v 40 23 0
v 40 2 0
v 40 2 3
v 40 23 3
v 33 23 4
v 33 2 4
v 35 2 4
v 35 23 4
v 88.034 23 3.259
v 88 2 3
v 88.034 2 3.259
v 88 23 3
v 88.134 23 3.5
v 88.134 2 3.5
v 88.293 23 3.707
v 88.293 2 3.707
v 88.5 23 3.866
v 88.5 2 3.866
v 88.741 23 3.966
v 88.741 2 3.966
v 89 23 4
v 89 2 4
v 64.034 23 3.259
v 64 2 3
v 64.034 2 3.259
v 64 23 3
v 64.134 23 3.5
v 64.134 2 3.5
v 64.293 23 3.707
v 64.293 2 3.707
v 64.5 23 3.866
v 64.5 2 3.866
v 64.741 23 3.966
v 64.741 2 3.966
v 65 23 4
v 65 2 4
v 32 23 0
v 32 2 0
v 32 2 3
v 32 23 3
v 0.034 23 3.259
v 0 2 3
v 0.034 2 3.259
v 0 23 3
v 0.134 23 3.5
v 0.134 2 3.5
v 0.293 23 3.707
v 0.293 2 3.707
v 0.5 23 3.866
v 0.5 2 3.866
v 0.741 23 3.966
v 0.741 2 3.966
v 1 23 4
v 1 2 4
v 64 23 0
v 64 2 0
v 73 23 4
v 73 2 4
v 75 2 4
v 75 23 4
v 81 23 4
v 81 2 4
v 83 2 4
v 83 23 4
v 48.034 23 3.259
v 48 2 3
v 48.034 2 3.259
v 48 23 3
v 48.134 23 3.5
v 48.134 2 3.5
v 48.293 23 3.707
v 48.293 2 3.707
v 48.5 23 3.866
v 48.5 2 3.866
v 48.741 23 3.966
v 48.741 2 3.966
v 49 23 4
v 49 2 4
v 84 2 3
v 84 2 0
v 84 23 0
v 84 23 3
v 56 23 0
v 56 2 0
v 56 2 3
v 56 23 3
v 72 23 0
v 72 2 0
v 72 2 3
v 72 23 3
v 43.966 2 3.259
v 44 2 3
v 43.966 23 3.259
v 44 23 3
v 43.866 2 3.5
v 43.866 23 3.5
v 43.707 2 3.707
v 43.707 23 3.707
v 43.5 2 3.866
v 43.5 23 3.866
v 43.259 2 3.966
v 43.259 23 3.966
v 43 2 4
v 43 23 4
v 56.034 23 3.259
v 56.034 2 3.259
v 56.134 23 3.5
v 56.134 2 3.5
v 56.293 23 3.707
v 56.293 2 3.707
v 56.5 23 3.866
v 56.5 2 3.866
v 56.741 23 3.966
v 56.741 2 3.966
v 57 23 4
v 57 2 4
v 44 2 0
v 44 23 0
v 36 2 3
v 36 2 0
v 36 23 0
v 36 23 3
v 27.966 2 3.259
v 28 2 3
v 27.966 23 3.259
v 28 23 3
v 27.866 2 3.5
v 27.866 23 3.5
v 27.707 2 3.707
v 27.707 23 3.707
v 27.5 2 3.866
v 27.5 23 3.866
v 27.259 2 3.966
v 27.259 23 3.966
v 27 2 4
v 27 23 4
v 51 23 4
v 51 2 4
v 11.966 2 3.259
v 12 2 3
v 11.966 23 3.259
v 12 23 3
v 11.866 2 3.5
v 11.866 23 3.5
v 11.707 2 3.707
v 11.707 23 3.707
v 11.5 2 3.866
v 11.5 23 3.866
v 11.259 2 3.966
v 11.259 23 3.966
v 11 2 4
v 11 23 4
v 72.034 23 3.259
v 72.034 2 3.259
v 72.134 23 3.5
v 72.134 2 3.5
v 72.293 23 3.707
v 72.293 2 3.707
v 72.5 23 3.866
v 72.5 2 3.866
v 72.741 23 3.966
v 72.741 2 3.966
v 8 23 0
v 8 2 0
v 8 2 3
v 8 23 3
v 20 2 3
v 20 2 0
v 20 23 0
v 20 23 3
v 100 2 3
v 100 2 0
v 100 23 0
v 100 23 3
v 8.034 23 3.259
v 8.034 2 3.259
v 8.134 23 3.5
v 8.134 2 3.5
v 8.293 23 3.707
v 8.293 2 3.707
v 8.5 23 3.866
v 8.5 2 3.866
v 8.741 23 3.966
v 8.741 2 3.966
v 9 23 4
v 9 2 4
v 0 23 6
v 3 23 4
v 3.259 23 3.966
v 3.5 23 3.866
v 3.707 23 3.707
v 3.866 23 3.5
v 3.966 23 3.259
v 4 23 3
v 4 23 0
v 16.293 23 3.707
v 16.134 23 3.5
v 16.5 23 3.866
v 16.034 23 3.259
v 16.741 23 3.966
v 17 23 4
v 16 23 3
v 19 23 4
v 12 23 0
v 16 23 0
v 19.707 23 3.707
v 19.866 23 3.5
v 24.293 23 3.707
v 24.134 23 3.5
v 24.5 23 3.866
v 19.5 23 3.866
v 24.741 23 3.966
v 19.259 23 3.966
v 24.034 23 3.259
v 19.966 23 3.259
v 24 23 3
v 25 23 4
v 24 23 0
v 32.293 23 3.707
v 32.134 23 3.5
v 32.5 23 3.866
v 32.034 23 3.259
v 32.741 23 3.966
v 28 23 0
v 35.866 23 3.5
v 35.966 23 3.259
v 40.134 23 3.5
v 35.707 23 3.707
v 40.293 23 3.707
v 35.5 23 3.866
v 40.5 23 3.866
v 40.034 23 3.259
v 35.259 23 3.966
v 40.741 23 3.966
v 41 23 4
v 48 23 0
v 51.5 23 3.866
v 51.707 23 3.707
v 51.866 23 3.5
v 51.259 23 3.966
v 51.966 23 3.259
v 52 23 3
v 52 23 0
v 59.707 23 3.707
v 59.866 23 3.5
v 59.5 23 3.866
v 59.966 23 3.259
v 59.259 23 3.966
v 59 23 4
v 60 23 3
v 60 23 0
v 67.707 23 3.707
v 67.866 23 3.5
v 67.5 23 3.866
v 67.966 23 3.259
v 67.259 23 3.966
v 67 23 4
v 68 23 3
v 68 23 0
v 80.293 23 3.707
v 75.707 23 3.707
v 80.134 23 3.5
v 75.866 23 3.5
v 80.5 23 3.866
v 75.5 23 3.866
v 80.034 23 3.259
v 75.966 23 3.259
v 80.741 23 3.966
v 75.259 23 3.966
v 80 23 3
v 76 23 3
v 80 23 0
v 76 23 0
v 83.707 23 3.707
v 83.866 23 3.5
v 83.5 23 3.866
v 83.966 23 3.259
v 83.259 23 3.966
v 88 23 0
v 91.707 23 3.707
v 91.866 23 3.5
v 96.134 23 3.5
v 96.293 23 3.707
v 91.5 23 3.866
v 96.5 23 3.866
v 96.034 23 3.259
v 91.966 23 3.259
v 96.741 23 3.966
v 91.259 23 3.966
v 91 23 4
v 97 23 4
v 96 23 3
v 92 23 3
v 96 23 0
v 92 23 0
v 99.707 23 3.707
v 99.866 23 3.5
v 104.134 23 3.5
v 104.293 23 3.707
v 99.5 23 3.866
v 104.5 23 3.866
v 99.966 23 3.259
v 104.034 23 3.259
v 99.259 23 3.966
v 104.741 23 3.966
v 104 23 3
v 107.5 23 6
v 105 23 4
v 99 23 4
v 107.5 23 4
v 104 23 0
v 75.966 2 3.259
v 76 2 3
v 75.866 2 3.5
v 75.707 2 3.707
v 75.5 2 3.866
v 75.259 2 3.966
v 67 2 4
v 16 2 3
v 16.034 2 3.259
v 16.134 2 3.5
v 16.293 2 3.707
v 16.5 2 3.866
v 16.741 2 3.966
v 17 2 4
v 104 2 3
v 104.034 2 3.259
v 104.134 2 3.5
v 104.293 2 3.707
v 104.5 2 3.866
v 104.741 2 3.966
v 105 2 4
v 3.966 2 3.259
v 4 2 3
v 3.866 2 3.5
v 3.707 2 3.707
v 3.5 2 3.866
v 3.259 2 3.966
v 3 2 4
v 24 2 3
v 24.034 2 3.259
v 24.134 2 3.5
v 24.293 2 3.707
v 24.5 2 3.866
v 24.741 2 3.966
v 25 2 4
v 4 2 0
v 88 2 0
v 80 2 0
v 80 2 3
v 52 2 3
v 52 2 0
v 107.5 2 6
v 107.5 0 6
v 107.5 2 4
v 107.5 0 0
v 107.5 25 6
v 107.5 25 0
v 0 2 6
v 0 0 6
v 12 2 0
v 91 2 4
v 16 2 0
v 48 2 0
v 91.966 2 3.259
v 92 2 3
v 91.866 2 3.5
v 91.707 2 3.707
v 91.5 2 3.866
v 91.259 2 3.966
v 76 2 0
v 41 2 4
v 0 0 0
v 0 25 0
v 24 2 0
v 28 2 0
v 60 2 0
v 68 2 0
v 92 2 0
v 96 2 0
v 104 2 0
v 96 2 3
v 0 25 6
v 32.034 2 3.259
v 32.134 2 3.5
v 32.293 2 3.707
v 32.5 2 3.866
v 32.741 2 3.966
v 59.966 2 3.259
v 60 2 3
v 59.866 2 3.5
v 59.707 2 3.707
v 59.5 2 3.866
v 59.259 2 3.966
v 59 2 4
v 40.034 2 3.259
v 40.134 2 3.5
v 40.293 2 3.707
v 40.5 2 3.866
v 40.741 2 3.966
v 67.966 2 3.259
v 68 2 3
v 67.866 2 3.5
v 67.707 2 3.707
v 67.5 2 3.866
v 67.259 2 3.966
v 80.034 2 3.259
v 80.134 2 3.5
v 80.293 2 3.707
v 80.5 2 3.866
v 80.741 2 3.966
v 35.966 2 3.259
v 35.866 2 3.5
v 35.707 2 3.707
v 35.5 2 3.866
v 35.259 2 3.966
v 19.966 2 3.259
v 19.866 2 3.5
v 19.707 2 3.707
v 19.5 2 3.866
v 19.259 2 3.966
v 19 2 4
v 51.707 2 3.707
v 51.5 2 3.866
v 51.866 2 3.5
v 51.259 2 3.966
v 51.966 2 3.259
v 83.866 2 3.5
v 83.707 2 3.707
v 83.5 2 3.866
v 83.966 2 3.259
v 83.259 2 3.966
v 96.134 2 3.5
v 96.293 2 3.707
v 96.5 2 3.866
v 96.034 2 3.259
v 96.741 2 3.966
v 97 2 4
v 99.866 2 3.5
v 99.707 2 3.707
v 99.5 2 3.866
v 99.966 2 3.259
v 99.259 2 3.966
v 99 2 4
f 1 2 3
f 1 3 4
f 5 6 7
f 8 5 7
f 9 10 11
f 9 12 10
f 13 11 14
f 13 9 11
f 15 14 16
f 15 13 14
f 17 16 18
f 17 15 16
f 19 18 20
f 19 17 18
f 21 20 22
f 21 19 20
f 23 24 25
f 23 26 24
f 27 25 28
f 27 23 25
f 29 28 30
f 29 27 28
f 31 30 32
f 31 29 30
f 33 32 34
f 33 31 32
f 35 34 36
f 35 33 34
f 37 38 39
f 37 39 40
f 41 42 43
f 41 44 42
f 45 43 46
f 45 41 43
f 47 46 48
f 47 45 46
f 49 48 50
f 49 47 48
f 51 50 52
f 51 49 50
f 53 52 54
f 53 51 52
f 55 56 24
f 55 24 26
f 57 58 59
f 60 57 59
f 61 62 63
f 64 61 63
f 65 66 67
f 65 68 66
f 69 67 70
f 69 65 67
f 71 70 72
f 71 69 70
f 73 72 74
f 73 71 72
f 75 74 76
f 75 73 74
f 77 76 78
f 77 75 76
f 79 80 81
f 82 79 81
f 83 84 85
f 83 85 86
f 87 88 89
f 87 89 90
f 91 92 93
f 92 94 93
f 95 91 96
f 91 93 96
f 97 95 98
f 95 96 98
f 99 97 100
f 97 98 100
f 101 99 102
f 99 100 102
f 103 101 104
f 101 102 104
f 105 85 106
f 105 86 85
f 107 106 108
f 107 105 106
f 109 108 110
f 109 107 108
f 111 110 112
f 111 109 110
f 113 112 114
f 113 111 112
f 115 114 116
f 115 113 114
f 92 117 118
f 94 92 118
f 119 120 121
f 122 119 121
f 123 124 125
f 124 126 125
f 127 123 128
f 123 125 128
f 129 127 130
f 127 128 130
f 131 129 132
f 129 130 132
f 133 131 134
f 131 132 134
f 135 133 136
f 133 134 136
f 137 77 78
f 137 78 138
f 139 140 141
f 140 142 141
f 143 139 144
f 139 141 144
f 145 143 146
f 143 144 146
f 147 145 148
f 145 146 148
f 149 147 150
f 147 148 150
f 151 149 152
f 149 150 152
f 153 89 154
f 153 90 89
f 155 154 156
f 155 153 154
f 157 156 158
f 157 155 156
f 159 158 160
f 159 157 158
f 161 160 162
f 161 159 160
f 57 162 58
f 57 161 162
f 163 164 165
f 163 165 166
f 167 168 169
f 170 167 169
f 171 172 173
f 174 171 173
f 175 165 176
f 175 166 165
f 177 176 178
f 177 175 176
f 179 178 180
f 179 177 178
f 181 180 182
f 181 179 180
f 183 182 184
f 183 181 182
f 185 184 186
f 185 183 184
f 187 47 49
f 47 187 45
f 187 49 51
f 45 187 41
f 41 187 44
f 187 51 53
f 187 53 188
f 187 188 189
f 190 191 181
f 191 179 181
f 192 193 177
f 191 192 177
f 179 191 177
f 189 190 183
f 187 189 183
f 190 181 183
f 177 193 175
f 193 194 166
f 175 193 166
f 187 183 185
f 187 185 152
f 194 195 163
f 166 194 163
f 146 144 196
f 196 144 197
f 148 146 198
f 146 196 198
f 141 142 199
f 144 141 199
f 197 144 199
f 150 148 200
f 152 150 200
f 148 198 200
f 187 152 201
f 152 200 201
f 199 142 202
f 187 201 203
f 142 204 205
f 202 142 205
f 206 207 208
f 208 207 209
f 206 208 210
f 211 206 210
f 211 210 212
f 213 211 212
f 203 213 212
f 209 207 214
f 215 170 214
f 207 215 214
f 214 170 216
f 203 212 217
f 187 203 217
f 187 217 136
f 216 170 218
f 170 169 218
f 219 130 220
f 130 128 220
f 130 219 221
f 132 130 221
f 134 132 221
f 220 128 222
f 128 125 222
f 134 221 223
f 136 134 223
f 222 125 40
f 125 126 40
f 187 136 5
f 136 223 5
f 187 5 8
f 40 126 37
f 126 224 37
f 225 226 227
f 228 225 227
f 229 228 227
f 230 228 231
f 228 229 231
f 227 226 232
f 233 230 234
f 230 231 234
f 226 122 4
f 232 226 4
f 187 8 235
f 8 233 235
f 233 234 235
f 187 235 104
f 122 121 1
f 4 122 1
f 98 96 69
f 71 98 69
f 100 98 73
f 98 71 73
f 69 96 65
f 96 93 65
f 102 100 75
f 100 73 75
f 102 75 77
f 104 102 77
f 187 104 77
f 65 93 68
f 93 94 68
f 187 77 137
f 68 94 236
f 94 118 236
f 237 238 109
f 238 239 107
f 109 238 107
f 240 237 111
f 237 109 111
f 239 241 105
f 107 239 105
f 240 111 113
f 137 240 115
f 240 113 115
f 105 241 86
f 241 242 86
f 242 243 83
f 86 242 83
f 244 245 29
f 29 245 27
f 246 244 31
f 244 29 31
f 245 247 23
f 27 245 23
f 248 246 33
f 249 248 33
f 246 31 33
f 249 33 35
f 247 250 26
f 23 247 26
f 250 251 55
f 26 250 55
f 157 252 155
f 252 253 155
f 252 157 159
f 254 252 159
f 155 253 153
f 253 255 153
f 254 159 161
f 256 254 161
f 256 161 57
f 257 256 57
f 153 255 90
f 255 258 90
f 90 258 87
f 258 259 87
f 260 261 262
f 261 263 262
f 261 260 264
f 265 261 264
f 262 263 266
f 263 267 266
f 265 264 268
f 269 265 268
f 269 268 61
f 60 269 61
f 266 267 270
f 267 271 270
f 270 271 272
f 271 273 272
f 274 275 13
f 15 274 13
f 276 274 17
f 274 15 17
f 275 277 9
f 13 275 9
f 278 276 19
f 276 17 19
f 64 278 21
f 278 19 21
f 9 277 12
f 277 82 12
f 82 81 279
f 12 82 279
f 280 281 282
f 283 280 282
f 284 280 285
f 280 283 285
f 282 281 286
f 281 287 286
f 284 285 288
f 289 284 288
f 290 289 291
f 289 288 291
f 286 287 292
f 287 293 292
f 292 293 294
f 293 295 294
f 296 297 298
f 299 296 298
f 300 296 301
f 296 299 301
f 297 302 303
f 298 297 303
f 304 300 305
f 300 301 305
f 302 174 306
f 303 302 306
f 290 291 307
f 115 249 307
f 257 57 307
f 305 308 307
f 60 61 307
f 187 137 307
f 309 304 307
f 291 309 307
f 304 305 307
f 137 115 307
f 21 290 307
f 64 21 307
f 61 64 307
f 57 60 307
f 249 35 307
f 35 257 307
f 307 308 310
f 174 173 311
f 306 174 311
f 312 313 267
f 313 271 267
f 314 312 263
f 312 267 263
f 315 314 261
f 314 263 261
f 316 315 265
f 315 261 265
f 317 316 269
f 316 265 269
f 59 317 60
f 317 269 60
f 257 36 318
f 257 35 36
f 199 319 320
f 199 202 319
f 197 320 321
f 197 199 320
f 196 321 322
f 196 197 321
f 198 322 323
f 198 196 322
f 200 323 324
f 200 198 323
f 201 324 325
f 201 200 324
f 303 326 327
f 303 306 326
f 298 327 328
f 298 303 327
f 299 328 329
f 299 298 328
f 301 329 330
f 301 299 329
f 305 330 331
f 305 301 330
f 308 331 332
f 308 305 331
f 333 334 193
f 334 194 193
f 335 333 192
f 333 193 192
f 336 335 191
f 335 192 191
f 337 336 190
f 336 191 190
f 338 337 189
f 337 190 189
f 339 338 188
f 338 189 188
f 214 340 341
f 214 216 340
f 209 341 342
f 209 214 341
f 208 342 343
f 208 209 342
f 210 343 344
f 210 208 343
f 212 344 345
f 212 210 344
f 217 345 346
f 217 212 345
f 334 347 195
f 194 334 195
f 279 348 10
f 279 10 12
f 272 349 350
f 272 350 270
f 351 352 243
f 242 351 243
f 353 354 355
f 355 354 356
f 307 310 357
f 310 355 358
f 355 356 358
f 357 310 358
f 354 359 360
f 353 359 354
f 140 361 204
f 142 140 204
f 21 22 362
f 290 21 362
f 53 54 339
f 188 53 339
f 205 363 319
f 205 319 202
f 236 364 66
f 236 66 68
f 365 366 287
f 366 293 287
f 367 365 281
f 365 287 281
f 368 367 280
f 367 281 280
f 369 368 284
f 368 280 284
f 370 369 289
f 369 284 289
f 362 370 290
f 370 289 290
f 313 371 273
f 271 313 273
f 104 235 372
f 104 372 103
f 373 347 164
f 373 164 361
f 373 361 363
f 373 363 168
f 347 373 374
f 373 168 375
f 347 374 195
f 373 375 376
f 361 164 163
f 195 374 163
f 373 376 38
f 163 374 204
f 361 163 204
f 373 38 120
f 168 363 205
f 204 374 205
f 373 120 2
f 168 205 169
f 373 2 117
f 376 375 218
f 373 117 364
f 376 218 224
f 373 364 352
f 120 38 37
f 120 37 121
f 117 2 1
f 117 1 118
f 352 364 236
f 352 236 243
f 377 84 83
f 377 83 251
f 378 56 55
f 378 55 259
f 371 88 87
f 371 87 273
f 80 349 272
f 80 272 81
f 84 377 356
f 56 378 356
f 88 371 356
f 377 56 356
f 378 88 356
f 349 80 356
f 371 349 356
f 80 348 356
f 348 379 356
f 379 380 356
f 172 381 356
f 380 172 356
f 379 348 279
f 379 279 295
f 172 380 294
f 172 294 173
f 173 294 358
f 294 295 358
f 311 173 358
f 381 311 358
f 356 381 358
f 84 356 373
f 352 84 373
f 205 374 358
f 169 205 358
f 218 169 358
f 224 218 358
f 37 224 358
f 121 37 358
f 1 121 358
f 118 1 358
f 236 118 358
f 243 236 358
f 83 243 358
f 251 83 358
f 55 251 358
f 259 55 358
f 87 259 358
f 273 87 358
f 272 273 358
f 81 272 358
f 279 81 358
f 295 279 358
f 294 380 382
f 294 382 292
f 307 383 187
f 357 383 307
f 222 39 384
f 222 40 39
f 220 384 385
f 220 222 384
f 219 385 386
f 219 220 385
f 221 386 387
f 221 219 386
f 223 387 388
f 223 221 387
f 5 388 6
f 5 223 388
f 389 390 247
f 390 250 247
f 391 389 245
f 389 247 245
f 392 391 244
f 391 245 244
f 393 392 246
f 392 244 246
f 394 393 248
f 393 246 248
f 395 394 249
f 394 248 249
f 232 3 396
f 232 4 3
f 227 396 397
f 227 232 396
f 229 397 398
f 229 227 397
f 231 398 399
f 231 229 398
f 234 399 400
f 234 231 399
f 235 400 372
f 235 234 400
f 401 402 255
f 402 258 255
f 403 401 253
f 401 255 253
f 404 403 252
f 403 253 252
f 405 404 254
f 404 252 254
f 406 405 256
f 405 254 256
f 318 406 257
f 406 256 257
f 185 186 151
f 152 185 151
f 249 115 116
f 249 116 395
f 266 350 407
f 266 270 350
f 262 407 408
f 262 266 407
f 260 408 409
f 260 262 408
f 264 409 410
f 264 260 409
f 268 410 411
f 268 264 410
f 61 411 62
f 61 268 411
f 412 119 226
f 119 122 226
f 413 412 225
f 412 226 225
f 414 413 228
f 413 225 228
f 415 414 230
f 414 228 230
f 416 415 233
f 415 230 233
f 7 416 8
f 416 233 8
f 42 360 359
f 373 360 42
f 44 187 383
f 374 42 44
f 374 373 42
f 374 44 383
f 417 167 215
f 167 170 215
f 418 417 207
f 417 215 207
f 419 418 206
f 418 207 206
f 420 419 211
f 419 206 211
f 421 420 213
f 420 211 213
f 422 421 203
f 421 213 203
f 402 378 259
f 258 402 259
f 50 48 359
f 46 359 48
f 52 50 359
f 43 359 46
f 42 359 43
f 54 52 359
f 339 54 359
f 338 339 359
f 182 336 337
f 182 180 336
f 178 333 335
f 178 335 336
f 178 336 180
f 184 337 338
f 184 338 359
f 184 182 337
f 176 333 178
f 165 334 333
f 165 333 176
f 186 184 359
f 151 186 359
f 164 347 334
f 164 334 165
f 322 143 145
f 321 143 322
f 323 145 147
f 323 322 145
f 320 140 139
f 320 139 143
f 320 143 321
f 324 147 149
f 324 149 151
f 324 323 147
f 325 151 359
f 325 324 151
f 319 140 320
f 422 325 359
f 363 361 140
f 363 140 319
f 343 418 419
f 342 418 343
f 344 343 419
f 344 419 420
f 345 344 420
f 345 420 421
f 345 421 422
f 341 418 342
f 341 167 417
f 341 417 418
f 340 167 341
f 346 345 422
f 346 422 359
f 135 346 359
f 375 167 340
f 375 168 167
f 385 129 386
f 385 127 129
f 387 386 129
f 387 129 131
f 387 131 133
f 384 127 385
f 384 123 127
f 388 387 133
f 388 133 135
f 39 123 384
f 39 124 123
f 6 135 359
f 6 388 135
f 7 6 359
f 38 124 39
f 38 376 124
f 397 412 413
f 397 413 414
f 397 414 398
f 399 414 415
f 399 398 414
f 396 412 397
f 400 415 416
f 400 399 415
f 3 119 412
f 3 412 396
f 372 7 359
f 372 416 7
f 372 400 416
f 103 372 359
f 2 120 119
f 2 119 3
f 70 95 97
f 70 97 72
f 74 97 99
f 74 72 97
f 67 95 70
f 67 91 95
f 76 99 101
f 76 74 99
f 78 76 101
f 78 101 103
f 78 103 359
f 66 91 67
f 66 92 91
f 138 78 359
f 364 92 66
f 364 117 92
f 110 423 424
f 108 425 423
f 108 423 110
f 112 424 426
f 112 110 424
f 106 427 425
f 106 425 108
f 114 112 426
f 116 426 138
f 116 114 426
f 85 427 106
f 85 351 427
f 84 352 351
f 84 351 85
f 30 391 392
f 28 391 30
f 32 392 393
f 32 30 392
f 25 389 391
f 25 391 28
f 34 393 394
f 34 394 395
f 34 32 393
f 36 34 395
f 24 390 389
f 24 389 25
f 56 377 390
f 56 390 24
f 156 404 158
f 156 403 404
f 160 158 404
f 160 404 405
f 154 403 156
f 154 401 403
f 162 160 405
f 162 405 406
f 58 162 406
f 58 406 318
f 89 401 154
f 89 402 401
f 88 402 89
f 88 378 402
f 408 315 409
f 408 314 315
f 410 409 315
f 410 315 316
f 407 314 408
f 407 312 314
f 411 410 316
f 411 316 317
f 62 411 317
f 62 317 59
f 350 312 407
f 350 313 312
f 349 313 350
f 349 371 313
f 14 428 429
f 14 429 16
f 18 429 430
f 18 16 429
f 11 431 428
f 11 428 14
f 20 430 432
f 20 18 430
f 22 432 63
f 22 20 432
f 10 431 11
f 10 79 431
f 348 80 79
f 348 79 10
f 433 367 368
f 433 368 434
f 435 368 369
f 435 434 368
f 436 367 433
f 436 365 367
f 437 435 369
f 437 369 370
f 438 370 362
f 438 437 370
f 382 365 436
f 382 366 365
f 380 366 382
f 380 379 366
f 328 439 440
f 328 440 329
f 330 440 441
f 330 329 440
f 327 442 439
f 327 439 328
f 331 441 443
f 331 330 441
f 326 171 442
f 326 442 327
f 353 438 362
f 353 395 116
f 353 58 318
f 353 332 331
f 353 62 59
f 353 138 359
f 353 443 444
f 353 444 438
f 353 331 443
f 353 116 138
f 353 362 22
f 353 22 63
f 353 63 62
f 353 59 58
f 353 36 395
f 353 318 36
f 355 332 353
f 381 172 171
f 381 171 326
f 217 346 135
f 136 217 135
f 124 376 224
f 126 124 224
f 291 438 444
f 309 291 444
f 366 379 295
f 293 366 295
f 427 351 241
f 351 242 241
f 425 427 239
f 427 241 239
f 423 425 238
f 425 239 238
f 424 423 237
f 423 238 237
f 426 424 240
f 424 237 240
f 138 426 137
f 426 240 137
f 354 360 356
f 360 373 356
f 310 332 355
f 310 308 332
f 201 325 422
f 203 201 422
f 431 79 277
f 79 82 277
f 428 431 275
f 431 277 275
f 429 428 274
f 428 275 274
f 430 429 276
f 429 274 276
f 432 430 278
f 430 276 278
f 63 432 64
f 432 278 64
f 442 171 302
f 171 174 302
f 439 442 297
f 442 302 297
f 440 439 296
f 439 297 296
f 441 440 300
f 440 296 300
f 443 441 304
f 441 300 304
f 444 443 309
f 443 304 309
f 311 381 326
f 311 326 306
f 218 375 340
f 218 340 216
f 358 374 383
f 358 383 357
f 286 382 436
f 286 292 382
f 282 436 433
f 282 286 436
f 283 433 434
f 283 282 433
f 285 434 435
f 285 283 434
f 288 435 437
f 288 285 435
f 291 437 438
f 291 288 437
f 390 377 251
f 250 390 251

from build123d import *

# Parameters (mm, degrees)
F0_W     = 107.5
F0_H     = 25
F0_W_2   = 4
F0_H_2   = 21
F1_DEPTH = 4
F2_R     = 1
F3_W     = 107.5
F3_H     = 2
F4_DEPTH = 2
F5_R     = 1


# Not quite as in the source:
# - a feature names something its author has since deleted; it is built from what else it names


with BuildPart() as f1:
    # F0 (on Top) → F1 (new body)
    with BuildSketch(Plane.XY):
        with Locations((53.75, 12.5)):
            Rectangle(F0_W, F0_H)
        with Locations((6, 12.5)):
            Rectangle(F0_W_2, F0_H_2, mode=Mode.SUBTRACT)
        with Locations((14, 12.5)):
            Rectangle(F0_W_2, F0_H_2, mode=Mode.SUBTRACT)
        with Locations((22, 12.5)):
            Rectangle(F0_W_2, F0_H_2, mode=Mode.SUBTRACT)
        with Locations((30, 12.5)):
            Rectangle(F0_W_2, F0_H_2, mode=Mode.SUBTRACT)
        with Locations((38, 12.5)):
            Rectangle(F0_W_2, F0_H_2, mode=Mode.SUBTRACT)
        with Locations((46, 12.5)):
            Rectangle(F0_W_2, F0_H_2, mode=Mode.SUBTRACT)
        with Locations((54, 12.5)):
            Rectangle(F0_W_2, F0_H_2, mode=Mode.SUBTRACT)
        with Locations((62, 12.5)):
            Rectangle(F0_W_2, F0_H_2, mode=Mode.SUBTRACT)
        with Locations((70, 12.5)):
            Rectangle(F0_W_2, F0_H_2, mode=Mode.SUBTRACT)
        with Locations((78, 12.5)):
            Rectangle(F0_W_2, F0_H_2, mode=Mode.SUBTRACT)
        with Locations((86, 12.5)):
            Rectangle(F0_W_2, F0_H_2, mode=Mode.SUBTRACT)
        with Locations((94, 12.5)):
            Rectangle(F0_W_2, F0_H_2, mode=Mode.SUBTRACT)
        with Locations((102, 12.5)):
            Rectangle(F0_W_2, F0_H_2, mode=Mode.SUBTRACT)
    extrude(amount=F1_DEPTH)

    # F2
    f2_edges = [f1.edges().sort_by_distance(p)[0] for p in [
        (8, 12.5, 4),
        (12, 12.5, 4),
        (16, 12.5, 4),
        (20, 12.5, 4),
        (24, 12.5, 4),
        (28, 12.5, 4),
        (32, 12.5, 4),
        (36, 12.5, 4),
        (40, 12.5, 4),
        (44, 12.5, 4),
        (48, 12.5, 4),
        (52, 12.5, 4),
        (56, 12.5, 4),
        (60, 12.5, 4),
        (64, 12.5, 4),
        (68, 12.5, 4),
        (72, 12.5, 4),
        (76, 12.5, 4),
        (80, 12.5, 4),
        (84, 12.5, 4),
        (88, 12.5, 4),
        (92, 12.5, 4),
        (96, 12.5, 4),
        (100, 12.5, 4),
        (104, 12.5, 4),
    ]]
    fillet(f2_edges, radius=F2_R)

    # F3 (on face) → F4 (join)
    with BuildSketch(Plane.XY.offset(4)):
        with Locations((53.75, 1)):
            Rectangle(F3_W, F3_H)
        with Locations((53.75, 24)):
            Rectangle(F3_W, F3_H)
    extrude(amount=F4_DEPTH)

    # F5
    f5_edges = [f1.edges().sort_by_distance(p)[0] for p in [
        (4, 12.5, 4),
        (0, 12.5, 4),
    ]]
    fillet(f5_edges, radius=F5_R)


solid = f1.part
